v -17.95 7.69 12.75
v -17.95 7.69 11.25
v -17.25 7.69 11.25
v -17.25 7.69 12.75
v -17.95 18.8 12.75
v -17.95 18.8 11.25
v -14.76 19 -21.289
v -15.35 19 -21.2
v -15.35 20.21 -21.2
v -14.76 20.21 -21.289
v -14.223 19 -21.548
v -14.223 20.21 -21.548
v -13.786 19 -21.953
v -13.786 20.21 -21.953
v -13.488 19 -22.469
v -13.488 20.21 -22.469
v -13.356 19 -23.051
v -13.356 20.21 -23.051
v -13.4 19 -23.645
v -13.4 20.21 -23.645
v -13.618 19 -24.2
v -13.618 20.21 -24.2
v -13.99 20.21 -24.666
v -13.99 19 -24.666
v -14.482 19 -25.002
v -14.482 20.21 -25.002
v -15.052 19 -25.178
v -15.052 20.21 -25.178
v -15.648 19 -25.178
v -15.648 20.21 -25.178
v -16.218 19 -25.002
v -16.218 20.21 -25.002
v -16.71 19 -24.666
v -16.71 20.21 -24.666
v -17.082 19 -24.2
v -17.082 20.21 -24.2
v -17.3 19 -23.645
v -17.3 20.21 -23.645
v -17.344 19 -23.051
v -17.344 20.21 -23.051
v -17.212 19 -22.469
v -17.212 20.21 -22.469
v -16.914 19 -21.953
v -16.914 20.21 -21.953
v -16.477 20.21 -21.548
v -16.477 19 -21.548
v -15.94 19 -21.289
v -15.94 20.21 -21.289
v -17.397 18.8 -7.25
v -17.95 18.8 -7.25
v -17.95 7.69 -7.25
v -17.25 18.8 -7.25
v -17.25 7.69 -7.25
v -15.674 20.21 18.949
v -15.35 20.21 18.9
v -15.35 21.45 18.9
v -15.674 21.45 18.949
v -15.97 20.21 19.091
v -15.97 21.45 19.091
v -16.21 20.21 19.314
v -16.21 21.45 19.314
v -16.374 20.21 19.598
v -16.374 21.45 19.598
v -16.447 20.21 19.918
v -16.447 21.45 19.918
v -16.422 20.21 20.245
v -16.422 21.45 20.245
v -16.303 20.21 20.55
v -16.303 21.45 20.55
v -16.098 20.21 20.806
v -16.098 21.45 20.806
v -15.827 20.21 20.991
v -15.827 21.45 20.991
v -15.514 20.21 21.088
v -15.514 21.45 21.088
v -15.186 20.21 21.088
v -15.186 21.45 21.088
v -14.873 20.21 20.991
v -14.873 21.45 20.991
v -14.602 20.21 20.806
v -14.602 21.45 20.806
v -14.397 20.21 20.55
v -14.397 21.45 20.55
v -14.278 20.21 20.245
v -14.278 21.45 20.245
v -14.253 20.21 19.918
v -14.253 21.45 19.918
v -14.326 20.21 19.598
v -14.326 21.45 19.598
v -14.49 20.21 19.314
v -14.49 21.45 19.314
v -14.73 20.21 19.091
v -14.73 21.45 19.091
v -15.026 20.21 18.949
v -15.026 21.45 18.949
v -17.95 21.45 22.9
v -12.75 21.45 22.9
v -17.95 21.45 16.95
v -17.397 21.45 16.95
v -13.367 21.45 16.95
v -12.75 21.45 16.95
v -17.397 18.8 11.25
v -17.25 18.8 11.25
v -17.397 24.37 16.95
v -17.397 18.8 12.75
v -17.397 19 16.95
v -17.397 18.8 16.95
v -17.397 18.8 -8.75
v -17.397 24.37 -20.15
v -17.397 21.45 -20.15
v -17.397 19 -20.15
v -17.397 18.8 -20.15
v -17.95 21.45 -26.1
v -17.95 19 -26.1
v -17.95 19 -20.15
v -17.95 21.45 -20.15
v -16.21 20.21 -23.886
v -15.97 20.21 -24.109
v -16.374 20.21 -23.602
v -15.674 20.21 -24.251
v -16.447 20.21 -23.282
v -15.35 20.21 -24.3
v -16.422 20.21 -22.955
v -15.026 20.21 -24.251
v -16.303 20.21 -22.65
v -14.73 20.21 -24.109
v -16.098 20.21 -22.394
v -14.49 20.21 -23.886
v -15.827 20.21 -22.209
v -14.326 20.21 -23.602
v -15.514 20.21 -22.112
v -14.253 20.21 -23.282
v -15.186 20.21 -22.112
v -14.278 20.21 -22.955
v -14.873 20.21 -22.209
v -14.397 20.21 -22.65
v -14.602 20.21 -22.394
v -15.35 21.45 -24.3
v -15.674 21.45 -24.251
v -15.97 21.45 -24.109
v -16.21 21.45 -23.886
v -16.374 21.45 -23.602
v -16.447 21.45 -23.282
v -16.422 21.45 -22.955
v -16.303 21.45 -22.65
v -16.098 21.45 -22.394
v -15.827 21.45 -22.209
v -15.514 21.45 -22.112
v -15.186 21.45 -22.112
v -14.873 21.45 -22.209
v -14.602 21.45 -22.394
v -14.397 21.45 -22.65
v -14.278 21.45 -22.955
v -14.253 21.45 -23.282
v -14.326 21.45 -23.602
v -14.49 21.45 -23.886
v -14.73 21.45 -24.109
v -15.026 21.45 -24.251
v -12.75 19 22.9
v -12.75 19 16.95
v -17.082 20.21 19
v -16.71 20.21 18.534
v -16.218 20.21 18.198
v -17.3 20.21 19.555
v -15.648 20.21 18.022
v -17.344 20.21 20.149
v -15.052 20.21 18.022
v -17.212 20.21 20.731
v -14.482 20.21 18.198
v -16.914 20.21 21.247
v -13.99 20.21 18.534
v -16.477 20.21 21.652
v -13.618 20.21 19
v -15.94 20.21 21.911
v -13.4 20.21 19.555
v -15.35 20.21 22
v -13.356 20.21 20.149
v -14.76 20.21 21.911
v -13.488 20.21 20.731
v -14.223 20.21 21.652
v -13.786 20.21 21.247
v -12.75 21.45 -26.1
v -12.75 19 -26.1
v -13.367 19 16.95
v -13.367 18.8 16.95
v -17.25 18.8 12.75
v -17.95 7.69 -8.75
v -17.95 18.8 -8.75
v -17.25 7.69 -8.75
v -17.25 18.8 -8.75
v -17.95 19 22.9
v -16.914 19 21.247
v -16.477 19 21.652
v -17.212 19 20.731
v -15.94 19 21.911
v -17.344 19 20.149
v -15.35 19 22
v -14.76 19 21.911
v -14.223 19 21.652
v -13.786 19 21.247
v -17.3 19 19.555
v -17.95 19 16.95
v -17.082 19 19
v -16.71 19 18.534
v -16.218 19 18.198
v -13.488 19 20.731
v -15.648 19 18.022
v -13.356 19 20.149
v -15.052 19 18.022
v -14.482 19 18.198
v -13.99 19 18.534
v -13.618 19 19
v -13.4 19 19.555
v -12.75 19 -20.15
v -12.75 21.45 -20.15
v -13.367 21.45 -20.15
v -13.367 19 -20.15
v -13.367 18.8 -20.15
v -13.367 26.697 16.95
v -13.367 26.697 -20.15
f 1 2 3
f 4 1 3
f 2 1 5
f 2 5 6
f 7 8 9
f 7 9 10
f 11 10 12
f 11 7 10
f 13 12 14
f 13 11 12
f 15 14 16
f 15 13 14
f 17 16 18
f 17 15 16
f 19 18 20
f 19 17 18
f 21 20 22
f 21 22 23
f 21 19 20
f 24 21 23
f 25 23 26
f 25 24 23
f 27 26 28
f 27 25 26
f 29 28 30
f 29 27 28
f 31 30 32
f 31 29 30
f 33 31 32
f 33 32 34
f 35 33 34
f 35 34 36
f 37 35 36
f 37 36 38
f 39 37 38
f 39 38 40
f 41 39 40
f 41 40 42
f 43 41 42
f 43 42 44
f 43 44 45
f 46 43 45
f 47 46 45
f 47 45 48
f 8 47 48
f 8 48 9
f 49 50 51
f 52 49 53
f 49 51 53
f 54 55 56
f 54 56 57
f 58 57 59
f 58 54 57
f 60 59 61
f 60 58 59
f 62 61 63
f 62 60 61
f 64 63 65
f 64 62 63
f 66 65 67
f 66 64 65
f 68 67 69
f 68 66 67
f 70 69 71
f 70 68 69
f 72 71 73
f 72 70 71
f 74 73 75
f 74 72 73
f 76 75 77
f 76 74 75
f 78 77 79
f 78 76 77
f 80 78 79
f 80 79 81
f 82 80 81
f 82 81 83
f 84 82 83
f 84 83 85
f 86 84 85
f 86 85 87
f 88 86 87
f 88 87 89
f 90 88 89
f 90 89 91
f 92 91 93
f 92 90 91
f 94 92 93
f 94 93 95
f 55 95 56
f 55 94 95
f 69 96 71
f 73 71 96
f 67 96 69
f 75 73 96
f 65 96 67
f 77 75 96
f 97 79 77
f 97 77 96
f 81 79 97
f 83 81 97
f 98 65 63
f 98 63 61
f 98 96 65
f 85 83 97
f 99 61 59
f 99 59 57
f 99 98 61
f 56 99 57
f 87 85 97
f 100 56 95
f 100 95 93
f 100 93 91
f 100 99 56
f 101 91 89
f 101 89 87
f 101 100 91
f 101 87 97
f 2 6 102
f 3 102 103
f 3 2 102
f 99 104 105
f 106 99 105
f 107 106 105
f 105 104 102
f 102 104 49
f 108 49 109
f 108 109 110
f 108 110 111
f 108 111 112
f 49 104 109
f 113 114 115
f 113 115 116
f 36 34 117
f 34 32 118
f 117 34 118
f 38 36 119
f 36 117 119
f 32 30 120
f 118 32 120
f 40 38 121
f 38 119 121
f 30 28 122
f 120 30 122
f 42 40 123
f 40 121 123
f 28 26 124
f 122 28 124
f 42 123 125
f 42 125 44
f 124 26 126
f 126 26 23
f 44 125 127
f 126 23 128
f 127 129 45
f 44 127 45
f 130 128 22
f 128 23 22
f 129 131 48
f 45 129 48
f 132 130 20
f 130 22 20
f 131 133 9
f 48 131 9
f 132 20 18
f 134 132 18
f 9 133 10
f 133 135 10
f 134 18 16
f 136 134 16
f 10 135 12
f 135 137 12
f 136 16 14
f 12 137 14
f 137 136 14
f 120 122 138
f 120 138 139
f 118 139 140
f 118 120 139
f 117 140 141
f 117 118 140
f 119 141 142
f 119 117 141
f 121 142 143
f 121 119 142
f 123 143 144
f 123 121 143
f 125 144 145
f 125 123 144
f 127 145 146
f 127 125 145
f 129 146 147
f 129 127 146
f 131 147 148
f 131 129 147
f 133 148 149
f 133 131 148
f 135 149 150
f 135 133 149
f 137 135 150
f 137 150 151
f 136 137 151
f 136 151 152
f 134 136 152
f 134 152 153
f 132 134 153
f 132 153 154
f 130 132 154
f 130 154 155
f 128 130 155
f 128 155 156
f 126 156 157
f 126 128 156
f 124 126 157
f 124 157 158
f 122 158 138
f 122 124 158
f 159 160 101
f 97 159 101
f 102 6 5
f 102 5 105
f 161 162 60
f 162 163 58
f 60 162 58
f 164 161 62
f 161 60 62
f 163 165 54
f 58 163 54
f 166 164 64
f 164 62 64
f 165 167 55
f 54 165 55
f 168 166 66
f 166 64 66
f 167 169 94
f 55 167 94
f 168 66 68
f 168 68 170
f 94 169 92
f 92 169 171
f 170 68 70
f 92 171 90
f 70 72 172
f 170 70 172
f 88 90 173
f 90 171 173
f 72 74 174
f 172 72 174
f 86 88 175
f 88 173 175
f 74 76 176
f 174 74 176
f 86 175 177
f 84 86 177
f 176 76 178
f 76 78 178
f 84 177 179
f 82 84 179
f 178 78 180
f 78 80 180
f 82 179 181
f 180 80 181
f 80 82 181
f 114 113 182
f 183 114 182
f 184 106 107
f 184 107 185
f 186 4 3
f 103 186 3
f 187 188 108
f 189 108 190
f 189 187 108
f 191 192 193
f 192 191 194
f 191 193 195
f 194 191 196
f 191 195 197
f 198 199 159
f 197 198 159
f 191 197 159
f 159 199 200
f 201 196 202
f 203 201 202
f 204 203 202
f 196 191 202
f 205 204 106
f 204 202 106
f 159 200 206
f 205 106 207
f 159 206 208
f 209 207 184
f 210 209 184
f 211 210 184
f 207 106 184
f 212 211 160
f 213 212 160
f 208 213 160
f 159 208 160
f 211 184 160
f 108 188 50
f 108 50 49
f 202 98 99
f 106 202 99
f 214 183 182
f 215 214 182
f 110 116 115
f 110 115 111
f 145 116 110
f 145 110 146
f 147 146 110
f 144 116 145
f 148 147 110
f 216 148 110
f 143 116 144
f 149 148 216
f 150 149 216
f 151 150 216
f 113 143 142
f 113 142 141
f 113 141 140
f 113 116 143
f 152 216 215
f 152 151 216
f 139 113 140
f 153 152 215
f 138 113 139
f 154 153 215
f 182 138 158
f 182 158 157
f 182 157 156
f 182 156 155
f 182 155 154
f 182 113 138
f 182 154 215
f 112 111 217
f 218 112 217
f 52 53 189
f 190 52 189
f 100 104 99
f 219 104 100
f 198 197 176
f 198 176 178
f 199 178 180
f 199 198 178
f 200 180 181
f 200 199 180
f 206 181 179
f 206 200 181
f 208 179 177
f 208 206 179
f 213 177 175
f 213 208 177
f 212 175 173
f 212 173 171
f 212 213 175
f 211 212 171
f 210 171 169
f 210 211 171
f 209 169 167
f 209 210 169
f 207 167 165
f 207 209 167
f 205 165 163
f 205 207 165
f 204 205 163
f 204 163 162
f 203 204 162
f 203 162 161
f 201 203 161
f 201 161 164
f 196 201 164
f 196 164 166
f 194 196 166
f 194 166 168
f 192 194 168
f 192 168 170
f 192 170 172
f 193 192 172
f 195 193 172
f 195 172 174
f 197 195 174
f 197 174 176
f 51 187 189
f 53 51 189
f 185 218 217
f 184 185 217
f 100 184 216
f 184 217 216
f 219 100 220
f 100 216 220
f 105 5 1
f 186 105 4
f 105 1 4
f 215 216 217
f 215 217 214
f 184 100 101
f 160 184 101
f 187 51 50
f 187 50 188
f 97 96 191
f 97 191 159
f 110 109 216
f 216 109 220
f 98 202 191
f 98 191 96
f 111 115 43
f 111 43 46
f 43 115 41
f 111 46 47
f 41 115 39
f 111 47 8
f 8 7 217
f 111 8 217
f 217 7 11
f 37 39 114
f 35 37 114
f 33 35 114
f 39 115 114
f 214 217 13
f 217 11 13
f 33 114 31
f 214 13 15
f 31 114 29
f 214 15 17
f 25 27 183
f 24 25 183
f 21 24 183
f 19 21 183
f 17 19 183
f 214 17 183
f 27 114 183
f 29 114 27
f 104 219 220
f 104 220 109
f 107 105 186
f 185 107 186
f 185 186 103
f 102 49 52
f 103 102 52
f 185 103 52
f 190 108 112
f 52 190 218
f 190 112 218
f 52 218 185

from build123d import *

# Parameters (mm, degrees)
CLAMP_START          = -20.15
CLAMP_X_COVER_DEPTH  = 37.1
EAR_START            = -26.1
SKETCH2_W            = 5.2
SKETCH2_H            = 2.45
EAR_X_COVER_26_DEPTH = 5.95
EAR_START_2          = 16.95
SKETCH3_W            = 5.2
SKETCH3_H            = 2.45
EAR_X_COVER_17_DEPTH = 5.95
CUT_EXTRUDE1_START   = 18.9
SKETCH4_R            = 1.1
CUT_EXTRUDE1_DEPTH   = 2.65
CUT_EXTRUDE2_START   = 18.99
SKETCH5_R            = 2
CUT_EXTRUDE2_DEPTH   = 1.22
BOSS_EXTRUDE4_START  = 7.69
SKETCH6_W            = 0.7
SKETCH6_H            = 1.5
BOSS_EXTRUDE4_DEPTH  = 11.11
BOSS_EXTRUDE5_START  = 7.69
SKETCH7_W            = 0.7
SKETCH7_H            = 1.5
BOSS_EXTRUDE5_DEPTH  = 11.11


with BuildPart() as part:
    # Sketch1 → Clamp -X cover (new body)
    with BuildSketch(Plane.XY.offset(CLAMP_START)):
        Polygon((-17.397275866, 18.8), (-13.367148847, 18.8), (-13.367148847, 26.696897507), (-17.397275866, 24.370102587), align=None)
    extrude(amount=CLAMP_X_COVER_DEPTH)

    # Sketch2 → Ear -X cover -26 (add)
    with BuildSketch(Plane.XY.offset(EAR_START)):
        with Locations((-15.35, 20.225)):
            Rectangle(SKETCH2_W, SKETCH2_H)
    extrude(amount=EAR_X_COVER_26_DEPTH)

    # Sketch3 → Ear -X cover 17 (add)
    with BuildSketch(Plane.XY.offset(EAR_START_2)):
        with Locations((-15.35, 20.225)):
            Rectangle(SKETCH3_W, SKETCH3_H)
    extrude(amount=EAR_X_COVER_17_DEPTH)

    # Sketch4 → Cut-Extrude1 (cut)
    with BuildSketch(Plane(origin=(0, 0, 0), x_dir=(1, 0, 0), z_dir=(0, 1, 0)).offset(CUT_EXTRUDE1_START)):
        with Locations(Location((-15.35, 23.2, 0), (0, 0, 90))):
            Circle(SKETCH4_R)
        with Locations(Location((-15.35, -20, 0), (0, 0, 90))):
            Circle(SKETCH4_R)
    extrude(amount=CUT_EXTRUDE1_DEPTH, mode=Mode.SUBTRACT)

    # Sketch5 → Cut-Extrude2 (cut)
    with BuildSketch(Plane(origin=(0, 0, 0), x_dir=(1, 0, 0), z_dir=(0, 1, 0)).offset(CUT_EXTRUDE2_START)):
        with Locations(Location((-15.35, 23.2, 0), (0, 0, 270))):
            Circle(SKETCH5_R)
        with Locations(Location((-15.35, -20, 0), (0, 0, 270))):
            Circle(SKETCH5_R)
    extrude(amount=CUT_EXTRUDE2_DEPTH, mode=Mode.SUBTRACT)

    # Sketch6 → Boss-Extrude4 (add)
    with BuildSketch(Plane(origin=(0, 0, 0), x_dir=(1, 0, 0), z_dir=(0, 1, 0)).offset(BOSS_EXTRUDE4_START)):
        with Locations((-17.6, 8)):
            Rectangle(SKETCH6_W, SKETCH6_H)
    extrude(amount=BOSS_EXTRUDE4_DEPTH)

    # Sketch7 → Boss-Extrude5 (add)
    with BuildSketch(Plane(origin=(0, 0, 0), x_dir=(1, 0, 0), z_dir=(0, 1, 0)).offset(BOSS_EXTRUDE5_START)):
        with Locations((-17.6, -12)):
            Rectangle(SKETCH7_W, SKETCH7_H)
    extrude(amount=BOSS_EXTRUDE5_DEPTH)


solid = part.part
